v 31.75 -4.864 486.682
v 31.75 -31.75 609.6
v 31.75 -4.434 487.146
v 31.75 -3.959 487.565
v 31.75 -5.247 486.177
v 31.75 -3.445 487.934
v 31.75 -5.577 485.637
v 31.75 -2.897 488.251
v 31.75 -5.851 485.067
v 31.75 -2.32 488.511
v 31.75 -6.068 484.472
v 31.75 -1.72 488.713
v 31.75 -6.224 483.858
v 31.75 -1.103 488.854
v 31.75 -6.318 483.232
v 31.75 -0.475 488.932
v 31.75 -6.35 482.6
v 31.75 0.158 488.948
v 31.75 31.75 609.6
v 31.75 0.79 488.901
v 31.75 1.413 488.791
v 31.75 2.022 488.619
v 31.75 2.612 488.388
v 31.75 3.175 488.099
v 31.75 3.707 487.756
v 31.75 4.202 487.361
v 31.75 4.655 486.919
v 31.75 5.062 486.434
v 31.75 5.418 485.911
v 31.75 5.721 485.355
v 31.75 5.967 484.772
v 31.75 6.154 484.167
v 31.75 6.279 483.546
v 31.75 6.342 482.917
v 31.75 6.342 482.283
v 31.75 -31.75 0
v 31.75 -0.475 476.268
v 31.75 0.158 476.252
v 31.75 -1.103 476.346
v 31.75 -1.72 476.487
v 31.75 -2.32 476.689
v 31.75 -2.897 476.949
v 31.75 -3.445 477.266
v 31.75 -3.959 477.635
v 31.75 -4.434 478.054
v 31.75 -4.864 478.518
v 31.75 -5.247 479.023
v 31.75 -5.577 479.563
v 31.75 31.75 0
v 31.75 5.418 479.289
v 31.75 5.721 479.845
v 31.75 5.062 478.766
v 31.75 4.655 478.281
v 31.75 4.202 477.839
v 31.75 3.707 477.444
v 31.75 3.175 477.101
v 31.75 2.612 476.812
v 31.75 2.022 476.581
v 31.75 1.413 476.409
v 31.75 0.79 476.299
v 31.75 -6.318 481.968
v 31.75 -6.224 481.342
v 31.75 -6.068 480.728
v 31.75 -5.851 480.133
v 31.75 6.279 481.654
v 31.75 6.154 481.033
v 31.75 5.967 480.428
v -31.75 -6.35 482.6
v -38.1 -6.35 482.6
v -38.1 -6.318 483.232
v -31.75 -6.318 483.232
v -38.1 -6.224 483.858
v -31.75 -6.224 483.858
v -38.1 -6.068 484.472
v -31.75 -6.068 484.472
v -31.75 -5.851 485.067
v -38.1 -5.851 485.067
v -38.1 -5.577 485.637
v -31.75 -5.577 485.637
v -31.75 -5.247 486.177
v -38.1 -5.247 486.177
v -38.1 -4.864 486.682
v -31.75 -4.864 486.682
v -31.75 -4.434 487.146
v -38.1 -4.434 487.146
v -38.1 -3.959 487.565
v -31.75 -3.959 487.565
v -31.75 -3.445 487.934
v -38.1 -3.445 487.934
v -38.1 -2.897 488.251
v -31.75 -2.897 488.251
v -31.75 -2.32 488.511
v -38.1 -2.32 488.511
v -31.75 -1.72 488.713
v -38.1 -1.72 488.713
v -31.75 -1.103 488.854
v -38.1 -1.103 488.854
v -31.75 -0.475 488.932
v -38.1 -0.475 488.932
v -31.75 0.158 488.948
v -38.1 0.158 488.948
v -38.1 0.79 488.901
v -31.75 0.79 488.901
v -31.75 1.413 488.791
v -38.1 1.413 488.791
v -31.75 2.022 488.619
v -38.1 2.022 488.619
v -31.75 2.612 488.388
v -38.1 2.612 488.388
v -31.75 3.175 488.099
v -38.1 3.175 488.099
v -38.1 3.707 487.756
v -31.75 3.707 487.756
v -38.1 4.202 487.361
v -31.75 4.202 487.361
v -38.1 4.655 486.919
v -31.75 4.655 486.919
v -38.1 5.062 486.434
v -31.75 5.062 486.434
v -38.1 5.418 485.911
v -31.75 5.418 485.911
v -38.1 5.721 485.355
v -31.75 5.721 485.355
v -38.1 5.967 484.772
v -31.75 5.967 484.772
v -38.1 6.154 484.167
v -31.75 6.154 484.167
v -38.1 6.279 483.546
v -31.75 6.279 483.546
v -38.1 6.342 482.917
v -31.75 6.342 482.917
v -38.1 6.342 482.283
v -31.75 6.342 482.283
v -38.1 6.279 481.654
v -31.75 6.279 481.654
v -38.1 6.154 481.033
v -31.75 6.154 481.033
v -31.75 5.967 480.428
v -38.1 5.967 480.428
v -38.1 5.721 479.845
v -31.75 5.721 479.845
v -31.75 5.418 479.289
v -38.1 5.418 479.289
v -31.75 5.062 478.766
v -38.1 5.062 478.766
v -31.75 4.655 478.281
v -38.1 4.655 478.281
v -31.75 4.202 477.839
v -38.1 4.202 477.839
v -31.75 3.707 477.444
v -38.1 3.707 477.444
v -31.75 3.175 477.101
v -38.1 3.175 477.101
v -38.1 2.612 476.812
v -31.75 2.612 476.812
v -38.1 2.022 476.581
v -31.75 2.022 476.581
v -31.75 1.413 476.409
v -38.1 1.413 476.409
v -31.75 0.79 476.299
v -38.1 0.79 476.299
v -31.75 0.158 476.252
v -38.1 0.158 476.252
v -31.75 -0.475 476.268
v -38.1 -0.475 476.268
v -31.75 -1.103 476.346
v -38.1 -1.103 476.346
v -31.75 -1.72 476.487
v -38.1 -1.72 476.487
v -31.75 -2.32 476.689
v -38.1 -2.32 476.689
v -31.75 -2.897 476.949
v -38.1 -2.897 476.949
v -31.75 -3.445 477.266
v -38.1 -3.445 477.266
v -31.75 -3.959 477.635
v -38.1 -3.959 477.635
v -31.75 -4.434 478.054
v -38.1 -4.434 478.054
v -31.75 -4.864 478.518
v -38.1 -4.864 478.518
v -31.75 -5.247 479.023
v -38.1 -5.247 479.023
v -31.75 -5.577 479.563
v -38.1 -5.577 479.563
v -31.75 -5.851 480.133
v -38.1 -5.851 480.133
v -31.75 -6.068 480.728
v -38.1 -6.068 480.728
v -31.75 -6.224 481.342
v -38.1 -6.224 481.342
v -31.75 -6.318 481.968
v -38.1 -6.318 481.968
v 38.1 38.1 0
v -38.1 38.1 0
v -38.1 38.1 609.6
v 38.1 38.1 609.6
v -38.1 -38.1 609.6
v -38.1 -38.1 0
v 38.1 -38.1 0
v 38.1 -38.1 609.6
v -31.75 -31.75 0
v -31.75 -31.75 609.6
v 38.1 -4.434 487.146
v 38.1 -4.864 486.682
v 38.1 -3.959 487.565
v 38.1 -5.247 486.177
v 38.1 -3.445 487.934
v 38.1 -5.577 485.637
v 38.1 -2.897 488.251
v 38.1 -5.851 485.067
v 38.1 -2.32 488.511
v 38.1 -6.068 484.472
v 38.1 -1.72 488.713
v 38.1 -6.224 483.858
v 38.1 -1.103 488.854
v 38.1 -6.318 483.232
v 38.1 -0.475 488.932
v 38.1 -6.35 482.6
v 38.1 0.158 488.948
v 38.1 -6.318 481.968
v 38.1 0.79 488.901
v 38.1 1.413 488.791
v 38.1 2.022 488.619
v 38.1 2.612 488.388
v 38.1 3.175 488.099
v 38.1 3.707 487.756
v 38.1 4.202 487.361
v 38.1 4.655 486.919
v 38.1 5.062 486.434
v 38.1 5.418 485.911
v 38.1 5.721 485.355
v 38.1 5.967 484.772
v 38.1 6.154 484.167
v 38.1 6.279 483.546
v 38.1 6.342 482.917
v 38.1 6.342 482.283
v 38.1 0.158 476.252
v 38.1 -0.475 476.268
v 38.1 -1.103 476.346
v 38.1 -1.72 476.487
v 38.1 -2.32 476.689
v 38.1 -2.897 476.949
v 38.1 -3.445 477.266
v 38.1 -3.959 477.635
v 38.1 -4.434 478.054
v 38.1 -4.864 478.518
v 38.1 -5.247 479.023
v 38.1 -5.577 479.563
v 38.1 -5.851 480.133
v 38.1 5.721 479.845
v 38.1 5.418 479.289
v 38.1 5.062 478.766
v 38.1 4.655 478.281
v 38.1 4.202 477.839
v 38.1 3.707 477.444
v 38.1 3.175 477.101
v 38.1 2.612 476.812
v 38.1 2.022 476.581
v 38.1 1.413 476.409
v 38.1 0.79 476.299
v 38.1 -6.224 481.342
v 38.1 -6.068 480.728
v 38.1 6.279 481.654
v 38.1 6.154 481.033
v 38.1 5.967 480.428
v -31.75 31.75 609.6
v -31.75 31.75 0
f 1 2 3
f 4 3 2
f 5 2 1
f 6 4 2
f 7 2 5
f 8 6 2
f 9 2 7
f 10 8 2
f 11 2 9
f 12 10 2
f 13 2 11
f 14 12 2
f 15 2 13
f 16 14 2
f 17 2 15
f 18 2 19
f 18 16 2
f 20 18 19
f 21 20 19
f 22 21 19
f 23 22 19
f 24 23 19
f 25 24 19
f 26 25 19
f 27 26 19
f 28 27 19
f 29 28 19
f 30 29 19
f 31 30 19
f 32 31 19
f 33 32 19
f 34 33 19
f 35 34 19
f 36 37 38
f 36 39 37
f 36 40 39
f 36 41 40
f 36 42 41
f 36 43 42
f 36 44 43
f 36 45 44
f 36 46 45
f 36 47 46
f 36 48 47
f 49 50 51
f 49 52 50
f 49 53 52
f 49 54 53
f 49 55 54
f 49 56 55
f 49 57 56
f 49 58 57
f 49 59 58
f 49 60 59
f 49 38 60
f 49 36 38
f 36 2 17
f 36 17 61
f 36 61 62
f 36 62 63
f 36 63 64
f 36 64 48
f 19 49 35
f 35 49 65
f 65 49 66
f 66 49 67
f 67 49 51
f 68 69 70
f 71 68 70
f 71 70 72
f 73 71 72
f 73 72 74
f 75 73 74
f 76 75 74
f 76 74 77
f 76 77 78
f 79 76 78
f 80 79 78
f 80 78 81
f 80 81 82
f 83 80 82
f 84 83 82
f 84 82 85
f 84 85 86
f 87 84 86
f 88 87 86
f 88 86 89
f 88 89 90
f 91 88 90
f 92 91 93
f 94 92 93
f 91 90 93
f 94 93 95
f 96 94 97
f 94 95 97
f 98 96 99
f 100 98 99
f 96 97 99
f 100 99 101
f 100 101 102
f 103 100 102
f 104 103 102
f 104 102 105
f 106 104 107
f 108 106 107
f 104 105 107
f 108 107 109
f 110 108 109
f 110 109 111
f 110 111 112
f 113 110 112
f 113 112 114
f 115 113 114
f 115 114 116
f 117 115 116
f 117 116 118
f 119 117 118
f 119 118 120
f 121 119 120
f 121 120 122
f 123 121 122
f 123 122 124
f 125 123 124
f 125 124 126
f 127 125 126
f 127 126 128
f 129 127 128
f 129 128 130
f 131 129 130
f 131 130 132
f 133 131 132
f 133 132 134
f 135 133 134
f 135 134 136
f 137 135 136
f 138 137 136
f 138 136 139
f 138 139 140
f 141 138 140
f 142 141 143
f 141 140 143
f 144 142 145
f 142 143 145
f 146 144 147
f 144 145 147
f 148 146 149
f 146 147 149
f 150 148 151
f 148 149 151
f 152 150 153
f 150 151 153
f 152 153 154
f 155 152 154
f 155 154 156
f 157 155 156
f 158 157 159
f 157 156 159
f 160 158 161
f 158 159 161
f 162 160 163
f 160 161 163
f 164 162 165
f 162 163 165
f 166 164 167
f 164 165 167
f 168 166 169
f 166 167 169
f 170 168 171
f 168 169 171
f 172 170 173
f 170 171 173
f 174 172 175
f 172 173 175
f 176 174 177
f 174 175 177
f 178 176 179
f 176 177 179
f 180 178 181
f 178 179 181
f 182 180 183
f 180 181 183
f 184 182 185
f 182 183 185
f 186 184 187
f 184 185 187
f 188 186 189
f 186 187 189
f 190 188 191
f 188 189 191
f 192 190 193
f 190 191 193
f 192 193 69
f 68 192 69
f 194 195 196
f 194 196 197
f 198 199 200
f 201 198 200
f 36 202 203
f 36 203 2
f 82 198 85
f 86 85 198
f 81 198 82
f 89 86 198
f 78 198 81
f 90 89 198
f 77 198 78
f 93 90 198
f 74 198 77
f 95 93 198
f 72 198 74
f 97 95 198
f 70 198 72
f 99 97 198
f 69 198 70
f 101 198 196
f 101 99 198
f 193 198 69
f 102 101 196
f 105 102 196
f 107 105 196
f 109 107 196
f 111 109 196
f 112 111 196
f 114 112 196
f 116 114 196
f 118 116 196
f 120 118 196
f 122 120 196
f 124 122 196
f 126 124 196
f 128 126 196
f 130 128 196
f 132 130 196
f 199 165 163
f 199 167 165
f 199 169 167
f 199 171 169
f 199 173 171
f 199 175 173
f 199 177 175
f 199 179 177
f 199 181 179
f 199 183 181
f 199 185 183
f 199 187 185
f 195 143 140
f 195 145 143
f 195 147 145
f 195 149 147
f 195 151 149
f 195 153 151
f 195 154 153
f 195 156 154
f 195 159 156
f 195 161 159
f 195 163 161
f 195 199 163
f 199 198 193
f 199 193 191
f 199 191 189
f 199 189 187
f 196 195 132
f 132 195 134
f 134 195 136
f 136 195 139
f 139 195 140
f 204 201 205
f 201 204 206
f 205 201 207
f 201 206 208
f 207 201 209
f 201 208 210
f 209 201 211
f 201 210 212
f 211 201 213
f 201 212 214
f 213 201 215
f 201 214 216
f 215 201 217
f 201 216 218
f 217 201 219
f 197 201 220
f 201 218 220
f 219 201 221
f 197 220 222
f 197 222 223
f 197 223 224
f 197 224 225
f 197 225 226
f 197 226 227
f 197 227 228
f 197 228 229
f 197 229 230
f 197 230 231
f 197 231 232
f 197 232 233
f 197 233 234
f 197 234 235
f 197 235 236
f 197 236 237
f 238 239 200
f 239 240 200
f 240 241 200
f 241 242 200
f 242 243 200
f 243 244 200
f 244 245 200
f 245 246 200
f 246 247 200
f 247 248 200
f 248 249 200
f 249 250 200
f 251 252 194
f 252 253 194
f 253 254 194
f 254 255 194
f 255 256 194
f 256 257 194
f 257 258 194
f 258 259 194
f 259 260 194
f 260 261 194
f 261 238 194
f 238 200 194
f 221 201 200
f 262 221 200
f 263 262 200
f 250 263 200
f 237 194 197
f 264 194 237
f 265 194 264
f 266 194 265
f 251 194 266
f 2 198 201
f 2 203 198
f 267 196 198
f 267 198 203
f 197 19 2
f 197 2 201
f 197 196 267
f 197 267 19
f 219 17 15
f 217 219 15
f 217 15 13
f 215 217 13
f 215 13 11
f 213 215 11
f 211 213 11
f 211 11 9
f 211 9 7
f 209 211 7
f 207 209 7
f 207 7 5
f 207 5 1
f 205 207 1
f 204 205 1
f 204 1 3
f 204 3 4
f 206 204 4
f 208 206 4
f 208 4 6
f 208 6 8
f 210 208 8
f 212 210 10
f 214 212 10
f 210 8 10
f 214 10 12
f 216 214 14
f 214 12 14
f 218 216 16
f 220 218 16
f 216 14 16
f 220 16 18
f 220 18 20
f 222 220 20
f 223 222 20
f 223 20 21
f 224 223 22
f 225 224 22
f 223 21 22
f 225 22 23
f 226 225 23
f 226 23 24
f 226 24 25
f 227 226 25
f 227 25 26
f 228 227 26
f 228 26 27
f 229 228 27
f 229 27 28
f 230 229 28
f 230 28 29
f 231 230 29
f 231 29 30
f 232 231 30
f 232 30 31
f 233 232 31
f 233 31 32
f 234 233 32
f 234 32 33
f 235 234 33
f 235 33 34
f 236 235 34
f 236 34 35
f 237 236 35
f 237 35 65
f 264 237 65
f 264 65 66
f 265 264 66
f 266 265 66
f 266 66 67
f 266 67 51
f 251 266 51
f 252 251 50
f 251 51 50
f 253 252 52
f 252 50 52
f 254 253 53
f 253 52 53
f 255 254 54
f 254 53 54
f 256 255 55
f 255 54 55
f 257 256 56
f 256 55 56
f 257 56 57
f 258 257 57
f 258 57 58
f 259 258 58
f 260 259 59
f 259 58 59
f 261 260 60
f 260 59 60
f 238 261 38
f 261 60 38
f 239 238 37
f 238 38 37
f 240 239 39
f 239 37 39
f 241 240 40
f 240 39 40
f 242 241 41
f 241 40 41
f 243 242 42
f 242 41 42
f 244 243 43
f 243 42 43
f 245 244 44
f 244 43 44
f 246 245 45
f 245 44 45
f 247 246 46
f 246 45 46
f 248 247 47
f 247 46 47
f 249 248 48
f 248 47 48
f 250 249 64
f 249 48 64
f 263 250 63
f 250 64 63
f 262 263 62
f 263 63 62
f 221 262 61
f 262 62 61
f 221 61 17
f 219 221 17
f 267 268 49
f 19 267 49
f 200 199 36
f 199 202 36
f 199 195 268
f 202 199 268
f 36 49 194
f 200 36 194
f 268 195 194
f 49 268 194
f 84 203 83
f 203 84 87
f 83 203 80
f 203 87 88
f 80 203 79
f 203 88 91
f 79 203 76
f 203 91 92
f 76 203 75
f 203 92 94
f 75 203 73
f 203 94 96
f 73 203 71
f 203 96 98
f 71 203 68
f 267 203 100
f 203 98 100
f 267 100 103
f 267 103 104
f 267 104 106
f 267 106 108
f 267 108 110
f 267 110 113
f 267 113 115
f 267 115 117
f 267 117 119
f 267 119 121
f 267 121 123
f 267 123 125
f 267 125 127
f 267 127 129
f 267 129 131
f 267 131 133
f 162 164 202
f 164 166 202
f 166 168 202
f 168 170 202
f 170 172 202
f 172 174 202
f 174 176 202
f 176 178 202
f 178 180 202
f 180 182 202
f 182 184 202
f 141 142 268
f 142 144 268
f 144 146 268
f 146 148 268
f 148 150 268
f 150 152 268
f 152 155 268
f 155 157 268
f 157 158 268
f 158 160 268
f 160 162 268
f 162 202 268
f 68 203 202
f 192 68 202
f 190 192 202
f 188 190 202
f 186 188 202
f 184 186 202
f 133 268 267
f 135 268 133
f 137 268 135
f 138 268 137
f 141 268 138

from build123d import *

# Parameters (mm, degrees)
F0_W     = 76.2
F0_H     = 76.2
F0_W_2   = 63.5
F0_H_2   = 63.5
F1_DEPTH = 609.6
F3_D     = 12.7


# Not quite as in the source:
# - a length typed as a fraction of an inch, garbled in the dataset ("3 / 203.2 mm" for 3/8 in), is restored


with BuildPart() as f1:
    # F0 (on Top) → F1 (new body)
    with BuildSketch(Plane.XY):
        Rectangle(F0_W, F0_H)
        Rectangle(F0_W_2, F0_H_2, mode=Mode.SUBTRACT)
    extrude(amount=F1_DEPTH)

    # F3 (through all)
    with Locations(Plane.YZ.offset(38.1)):
        with Locations((0, 482.6)):
            Hole(F3_D / 2)


solid = f1.part
